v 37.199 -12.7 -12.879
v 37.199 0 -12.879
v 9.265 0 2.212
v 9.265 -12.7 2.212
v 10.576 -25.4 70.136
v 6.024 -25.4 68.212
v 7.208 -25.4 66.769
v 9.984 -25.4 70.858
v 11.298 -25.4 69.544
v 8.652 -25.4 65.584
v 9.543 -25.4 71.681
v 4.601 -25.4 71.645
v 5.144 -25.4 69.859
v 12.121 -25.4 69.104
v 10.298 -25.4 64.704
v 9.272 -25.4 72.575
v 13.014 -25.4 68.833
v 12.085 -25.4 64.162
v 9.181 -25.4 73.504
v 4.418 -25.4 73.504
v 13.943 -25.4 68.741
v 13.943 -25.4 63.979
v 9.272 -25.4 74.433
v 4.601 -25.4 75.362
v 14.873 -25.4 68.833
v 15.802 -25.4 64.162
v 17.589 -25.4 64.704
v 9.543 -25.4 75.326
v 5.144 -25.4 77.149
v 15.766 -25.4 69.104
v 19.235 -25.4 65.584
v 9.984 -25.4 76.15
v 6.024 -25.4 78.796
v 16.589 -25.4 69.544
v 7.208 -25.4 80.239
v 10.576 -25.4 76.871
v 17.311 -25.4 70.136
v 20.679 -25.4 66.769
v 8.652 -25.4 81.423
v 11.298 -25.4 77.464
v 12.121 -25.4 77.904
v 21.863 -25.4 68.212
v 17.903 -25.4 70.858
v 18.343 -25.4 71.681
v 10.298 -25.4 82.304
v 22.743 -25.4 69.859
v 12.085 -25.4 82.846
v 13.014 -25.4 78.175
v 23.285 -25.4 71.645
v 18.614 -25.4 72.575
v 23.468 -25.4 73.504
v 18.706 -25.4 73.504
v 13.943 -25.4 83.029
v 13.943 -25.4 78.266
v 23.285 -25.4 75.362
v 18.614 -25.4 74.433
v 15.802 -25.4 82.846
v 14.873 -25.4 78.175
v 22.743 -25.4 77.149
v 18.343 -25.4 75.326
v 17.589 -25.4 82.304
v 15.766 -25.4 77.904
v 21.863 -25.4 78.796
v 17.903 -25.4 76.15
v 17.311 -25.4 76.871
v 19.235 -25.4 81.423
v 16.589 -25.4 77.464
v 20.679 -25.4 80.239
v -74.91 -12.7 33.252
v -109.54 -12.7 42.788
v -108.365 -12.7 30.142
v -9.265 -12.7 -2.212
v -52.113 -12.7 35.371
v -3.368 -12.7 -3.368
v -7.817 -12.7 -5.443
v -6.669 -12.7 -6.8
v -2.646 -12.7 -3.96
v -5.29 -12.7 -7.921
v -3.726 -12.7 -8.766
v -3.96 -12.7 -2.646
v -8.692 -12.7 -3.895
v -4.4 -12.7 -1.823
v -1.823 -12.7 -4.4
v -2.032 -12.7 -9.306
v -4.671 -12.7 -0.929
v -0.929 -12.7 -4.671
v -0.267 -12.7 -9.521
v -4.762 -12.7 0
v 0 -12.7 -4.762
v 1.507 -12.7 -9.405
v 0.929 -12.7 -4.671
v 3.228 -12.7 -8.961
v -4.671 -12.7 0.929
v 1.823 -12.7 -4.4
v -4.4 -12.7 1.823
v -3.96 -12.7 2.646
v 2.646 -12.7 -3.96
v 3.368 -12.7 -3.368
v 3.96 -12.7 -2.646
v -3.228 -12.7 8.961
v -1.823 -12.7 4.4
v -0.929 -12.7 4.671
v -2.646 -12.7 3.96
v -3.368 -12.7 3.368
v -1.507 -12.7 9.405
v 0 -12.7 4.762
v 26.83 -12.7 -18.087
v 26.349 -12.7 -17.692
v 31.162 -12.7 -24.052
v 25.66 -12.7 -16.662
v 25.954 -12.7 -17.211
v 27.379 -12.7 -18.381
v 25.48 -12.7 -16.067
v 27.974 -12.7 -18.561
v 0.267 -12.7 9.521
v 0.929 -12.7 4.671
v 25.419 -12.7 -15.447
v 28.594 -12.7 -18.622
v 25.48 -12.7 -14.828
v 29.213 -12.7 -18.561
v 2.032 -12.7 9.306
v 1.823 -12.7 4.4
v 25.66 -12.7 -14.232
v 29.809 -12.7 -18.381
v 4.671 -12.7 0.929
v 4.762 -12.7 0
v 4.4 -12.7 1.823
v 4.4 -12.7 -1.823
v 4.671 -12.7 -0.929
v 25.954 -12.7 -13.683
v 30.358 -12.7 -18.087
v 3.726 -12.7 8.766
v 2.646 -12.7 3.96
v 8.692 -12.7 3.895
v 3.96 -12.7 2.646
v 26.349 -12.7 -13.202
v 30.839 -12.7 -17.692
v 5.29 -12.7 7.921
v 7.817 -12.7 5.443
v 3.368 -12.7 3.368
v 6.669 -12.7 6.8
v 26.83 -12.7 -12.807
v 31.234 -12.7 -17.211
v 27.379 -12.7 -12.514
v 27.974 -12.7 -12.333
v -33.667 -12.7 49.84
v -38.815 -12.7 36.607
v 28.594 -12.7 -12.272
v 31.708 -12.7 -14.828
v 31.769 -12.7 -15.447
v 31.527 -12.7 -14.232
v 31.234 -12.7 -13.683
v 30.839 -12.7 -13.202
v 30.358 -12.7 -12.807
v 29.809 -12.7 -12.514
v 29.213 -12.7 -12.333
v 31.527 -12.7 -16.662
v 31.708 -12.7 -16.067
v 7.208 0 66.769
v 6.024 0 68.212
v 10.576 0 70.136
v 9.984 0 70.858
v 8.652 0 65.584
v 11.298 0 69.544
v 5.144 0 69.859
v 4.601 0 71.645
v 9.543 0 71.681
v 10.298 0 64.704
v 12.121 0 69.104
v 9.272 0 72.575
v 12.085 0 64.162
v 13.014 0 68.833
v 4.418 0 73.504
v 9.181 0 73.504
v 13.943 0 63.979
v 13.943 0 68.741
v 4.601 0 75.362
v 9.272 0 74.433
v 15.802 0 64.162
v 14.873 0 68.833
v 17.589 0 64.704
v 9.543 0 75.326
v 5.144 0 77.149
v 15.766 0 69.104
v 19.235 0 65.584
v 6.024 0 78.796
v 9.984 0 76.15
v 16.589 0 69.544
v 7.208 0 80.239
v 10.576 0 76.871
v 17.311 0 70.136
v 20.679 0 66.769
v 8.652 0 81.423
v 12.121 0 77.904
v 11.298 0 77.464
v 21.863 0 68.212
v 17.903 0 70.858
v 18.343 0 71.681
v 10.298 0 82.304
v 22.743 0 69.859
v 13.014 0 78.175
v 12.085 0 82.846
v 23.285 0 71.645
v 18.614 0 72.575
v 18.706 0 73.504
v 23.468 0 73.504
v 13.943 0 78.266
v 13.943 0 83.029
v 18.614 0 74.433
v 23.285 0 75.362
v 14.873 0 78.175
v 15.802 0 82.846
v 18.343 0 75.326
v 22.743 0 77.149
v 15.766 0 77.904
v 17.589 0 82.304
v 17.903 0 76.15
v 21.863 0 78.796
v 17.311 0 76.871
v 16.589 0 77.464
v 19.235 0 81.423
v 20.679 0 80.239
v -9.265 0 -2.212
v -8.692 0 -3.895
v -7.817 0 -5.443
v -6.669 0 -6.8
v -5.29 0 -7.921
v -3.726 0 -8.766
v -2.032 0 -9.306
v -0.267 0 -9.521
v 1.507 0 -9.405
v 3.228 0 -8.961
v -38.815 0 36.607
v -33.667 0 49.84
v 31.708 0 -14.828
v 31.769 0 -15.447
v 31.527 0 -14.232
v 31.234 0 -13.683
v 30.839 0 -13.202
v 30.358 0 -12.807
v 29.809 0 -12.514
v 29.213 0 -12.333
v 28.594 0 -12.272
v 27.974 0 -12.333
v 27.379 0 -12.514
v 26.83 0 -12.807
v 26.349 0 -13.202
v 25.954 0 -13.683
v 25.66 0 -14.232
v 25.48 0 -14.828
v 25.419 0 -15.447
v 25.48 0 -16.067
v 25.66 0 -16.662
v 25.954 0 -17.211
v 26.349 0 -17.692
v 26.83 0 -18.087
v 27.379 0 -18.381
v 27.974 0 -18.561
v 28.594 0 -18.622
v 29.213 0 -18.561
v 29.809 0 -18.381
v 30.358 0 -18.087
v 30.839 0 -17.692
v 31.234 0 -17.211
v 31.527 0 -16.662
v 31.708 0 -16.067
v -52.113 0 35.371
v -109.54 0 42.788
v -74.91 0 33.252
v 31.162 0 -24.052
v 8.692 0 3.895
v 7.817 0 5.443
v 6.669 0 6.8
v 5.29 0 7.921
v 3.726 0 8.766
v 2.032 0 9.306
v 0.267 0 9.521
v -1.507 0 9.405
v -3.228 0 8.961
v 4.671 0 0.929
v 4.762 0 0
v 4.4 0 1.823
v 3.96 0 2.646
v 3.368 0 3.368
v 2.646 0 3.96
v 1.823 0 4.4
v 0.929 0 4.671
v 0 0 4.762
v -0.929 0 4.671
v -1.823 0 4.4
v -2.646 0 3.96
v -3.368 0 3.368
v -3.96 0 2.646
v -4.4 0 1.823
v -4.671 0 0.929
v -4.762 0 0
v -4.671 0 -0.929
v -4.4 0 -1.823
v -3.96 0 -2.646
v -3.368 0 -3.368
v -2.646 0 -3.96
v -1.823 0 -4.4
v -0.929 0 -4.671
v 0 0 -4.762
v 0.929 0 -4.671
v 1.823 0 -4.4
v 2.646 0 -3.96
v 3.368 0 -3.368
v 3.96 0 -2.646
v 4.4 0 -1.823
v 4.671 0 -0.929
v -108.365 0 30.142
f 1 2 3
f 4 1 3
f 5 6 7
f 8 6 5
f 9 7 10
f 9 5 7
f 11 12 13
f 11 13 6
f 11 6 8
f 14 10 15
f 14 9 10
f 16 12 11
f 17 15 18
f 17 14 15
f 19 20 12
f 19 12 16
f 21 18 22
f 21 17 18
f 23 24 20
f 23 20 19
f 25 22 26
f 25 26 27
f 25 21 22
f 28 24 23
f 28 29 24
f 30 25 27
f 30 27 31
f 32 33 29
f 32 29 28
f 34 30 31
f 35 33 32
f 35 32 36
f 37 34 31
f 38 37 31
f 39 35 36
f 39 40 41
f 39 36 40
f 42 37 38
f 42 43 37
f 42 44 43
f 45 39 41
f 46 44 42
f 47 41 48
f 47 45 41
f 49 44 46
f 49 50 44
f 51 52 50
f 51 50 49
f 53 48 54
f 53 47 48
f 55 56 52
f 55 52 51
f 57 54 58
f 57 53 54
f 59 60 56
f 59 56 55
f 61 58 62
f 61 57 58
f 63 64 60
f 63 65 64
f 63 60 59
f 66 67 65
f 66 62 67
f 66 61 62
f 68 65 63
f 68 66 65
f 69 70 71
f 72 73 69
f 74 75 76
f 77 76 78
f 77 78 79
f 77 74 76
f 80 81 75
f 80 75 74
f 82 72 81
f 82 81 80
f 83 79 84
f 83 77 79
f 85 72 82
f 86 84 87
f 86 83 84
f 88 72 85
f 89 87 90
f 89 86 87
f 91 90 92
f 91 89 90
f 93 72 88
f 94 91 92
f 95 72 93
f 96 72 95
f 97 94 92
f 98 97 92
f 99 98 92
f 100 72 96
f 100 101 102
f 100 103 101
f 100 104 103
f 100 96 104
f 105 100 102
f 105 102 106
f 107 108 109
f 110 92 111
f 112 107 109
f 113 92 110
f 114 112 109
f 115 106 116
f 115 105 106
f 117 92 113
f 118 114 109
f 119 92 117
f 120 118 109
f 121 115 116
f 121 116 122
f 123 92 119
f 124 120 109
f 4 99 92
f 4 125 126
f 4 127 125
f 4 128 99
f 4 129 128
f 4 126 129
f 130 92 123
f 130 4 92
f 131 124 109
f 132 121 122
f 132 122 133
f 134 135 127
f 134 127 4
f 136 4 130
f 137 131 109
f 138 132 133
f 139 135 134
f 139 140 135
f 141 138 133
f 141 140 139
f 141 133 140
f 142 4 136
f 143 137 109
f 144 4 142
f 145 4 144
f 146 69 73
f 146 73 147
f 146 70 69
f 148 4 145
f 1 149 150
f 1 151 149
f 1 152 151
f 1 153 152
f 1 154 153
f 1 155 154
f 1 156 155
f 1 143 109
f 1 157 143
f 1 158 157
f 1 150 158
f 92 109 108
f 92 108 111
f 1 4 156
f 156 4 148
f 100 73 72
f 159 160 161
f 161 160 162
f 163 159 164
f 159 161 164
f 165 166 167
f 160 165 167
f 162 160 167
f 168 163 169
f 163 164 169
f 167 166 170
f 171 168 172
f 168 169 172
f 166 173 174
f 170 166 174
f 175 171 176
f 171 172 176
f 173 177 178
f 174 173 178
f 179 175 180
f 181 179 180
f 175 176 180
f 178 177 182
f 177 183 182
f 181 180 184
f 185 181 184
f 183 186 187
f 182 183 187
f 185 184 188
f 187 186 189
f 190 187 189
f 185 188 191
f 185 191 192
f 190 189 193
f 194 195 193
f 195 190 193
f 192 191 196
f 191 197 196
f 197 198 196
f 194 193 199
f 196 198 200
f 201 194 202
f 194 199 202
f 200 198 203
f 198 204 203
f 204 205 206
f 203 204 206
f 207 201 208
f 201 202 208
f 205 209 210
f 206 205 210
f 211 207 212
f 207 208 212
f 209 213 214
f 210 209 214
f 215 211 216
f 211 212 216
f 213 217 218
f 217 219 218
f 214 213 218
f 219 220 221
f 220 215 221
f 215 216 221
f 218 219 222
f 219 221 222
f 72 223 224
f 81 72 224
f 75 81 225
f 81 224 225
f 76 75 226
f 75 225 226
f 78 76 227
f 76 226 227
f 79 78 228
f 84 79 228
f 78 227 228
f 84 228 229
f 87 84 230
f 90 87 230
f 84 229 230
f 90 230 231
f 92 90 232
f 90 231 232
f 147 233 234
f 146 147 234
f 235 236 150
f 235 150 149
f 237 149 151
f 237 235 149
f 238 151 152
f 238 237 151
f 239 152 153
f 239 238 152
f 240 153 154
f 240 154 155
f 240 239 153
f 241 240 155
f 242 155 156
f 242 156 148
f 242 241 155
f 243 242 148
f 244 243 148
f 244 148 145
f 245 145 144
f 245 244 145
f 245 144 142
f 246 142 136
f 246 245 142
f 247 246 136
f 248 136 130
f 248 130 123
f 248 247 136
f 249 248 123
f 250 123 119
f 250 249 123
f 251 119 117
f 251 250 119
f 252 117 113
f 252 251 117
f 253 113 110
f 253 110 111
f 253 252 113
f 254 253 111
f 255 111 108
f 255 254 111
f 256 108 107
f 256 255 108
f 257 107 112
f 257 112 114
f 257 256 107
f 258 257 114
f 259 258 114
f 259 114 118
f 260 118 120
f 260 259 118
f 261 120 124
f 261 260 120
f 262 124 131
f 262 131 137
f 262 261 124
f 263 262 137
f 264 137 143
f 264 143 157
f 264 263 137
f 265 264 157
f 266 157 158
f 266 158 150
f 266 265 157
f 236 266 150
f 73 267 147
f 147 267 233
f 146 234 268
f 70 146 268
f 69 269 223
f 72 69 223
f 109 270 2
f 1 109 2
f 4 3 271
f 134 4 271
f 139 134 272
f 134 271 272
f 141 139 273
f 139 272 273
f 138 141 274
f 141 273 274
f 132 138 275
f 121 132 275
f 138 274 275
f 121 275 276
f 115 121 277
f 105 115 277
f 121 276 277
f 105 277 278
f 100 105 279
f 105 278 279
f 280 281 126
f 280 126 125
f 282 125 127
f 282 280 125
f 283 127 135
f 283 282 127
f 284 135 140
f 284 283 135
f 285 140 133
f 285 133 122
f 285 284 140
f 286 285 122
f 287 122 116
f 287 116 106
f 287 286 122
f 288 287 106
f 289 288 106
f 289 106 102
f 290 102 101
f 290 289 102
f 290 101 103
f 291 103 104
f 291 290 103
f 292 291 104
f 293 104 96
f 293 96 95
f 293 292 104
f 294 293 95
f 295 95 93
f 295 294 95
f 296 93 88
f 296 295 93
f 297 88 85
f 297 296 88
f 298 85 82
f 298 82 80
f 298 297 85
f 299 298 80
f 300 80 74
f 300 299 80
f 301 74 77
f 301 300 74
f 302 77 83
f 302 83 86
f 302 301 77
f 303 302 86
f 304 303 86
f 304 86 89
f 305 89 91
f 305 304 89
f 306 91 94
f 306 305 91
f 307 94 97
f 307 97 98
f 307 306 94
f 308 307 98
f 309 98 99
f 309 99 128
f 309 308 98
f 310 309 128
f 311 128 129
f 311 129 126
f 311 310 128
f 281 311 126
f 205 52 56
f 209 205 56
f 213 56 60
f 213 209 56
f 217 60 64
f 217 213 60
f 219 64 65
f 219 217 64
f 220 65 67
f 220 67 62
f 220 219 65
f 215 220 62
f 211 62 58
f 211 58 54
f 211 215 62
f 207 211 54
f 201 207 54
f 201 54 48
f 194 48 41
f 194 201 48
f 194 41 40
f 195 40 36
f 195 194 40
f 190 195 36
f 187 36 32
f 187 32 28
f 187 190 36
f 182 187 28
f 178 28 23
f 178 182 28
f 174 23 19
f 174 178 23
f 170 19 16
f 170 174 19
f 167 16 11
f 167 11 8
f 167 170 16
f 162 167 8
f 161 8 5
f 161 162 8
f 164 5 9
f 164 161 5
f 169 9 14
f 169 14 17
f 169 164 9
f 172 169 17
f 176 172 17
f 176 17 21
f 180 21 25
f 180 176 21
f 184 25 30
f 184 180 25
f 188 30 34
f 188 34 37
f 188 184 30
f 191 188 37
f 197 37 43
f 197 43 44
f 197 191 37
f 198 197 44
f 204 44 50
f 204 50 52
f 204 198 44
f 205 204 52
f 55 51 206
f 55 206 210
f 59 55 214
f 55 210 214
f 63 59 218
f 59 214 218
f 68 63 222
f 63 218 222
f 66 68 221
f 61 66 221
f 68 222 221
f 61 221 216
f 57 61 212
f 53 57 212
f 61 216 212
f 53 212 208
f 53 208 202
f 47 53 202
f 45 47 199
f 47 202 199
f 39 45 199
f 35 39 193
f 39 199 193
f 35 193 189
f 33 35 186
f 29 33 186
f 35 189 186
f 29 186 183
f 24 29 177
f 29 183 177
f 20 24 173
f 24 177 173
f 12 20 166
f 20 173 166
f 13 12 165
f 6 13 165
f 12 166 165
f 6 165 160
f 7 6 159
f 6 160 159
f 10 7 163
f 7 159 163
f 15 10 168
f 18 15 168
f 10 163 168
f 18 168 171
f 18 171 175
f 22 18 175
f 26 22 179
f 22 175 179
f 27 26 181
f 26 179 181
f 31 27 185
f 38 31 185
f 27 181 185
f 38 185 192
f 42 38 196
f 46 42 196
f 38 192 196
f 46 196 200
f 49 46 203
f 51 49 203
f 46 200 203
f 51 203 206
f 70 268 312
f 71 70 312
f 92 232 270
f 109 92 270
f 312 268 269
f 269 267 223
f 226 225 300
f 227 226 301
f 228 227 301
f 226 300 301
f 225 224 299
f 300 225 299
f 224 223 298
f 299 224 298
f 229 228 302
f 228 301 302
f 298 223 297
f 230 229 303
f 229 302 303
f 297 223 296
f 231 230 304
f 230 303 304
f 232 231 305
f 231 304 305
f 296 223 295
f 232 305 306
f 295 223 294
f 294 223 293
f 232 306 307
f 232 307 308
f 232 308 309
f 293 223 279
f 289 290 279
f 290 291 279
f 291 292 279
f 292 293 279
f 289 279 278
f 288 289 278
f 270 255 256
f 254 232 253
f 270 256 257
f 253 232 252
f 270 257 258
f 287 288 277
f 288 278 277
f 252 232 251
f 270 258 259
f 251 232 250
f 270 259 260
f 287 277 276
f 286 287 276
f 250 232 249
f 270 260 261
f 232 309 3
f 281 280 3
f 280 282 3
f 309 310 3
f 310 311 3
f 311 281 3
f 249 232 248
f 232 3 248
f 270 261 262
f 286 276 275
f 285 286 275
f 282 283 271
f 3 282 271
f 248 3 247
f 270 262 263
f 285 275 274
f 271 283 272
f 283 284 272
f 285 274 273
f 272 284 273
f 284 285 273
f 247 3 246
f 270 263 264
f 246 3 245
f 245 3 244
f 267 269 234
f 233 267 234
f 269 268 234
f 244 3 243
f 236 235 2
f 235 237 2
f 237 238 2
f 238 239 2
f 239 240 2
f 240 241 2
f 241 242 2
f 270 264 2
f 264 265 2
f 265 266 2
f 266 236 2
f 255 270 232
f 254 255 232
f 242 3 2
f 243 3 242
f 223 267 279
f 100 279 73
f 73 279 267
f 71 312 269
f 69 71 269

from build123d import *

# Parameters (mm, degrees)
F0_R     = 4.7625
F0_R_2   = 3.175
F1_DEPTH = 12.7
F0_R_3   = 9.525
F2_DEPTH = 25.4


# Not quite as in the source:
# - a feature names something its author has since deleted; it is built from what else it names


with BuildPart() as f1:
    # F0 (on Front) → F1 (new body)
    with BuildSketch(Plane.XZ):
        with BuildLine():
            ThreePointArc((3.2280459011, -8.9613249389), (7.7933549325, -5.4762435935), (9.525, 0))
            ThreePointArc((9.525, 0), (9.459652863, 1.1138189762), (9.264508092, 2.2123550376))
            ThreePointArc((9.264508092, 2.2123550376), (4.5273466432, 8.3802599824), (-3.2280459011, 8.9613249389))
            ThreePointArc((-3.2280459011, 8.9613249389), (-8.3802599824, 4.5273466432), (-9.264508092, -2.2123550376))
            ThreePointArc((-9.264508092, -2.2123550376), (-4.5273466432, -8.3802599824), (3.2280459011, -8.9613249389))
        make_face()
        Circle(F0_R, mode=Mode.SUBTRACT)
        with BuildLine():
            ThreePointArc((9.264508092, 2.2123550376), (9.459652863, 1.1138189762), (9.525, 0))
            ThreePointArc((9.525, 0), (7.7933549325, -5.4762435935), (3.2280459011, -8.9613249389))
            Line((3.2280459011, -8.9613249389), (31.1622458424, -24.0524804162))
            Line((31.1622458424, -24.0524804162), (37.1987080333, -12.8788004396))
            Line((37.1987080333, -12.8788004396), (9.264508092, 2.2123550376))
        make_face()
        with Locations((28.5936369496, -15.4474093325)):
            Circle(F0_R_2, mode=Mode.SUBTRACT)
        with BuildLine():
            ThreePointArc((-9.264508092, -2.2123550376), (-8.3802599824, 4.5273466432), (-3.2280459011, 8.9613249389))
            Line((-3.2280459011, 8.9613249389), (-52.1128957984, 35.3708470241))
            Line((-52.1128957984, 35.3708470241), (-74.9098779541, 33.251860334))
            Line((-74.9098779541, 33.251860334), (-9.264508092, -2.2123550376))
        make_face()
        Polygon((-74.9098779541, 33.251860334), (-52.1128957984, 35.3708470241), (-38.8146562076, 36.6069225934), (-33.6673133028, 49.8401142349), (-109.5402561535, 42.787700238), (-108.3648538207, 30.1422097629), align=None)
    extrude(amount=F1_DEPTH)


with BuildPart() as f2:
    # F0 (on Front) → F2 (new body)
    with BuildSketch(Plane.XZ):
        with Locations((13.9434637961, 73.5037211458)):
            Circle(F0_R_3)
        with Locations((13.9434637961, 73.5037211458)):
            Circle(F0_R, mode=Mode.SUBTRACT)
    extrude(amount=F2_DEPTH)


solid = Compound([f1.part, f2.part])
